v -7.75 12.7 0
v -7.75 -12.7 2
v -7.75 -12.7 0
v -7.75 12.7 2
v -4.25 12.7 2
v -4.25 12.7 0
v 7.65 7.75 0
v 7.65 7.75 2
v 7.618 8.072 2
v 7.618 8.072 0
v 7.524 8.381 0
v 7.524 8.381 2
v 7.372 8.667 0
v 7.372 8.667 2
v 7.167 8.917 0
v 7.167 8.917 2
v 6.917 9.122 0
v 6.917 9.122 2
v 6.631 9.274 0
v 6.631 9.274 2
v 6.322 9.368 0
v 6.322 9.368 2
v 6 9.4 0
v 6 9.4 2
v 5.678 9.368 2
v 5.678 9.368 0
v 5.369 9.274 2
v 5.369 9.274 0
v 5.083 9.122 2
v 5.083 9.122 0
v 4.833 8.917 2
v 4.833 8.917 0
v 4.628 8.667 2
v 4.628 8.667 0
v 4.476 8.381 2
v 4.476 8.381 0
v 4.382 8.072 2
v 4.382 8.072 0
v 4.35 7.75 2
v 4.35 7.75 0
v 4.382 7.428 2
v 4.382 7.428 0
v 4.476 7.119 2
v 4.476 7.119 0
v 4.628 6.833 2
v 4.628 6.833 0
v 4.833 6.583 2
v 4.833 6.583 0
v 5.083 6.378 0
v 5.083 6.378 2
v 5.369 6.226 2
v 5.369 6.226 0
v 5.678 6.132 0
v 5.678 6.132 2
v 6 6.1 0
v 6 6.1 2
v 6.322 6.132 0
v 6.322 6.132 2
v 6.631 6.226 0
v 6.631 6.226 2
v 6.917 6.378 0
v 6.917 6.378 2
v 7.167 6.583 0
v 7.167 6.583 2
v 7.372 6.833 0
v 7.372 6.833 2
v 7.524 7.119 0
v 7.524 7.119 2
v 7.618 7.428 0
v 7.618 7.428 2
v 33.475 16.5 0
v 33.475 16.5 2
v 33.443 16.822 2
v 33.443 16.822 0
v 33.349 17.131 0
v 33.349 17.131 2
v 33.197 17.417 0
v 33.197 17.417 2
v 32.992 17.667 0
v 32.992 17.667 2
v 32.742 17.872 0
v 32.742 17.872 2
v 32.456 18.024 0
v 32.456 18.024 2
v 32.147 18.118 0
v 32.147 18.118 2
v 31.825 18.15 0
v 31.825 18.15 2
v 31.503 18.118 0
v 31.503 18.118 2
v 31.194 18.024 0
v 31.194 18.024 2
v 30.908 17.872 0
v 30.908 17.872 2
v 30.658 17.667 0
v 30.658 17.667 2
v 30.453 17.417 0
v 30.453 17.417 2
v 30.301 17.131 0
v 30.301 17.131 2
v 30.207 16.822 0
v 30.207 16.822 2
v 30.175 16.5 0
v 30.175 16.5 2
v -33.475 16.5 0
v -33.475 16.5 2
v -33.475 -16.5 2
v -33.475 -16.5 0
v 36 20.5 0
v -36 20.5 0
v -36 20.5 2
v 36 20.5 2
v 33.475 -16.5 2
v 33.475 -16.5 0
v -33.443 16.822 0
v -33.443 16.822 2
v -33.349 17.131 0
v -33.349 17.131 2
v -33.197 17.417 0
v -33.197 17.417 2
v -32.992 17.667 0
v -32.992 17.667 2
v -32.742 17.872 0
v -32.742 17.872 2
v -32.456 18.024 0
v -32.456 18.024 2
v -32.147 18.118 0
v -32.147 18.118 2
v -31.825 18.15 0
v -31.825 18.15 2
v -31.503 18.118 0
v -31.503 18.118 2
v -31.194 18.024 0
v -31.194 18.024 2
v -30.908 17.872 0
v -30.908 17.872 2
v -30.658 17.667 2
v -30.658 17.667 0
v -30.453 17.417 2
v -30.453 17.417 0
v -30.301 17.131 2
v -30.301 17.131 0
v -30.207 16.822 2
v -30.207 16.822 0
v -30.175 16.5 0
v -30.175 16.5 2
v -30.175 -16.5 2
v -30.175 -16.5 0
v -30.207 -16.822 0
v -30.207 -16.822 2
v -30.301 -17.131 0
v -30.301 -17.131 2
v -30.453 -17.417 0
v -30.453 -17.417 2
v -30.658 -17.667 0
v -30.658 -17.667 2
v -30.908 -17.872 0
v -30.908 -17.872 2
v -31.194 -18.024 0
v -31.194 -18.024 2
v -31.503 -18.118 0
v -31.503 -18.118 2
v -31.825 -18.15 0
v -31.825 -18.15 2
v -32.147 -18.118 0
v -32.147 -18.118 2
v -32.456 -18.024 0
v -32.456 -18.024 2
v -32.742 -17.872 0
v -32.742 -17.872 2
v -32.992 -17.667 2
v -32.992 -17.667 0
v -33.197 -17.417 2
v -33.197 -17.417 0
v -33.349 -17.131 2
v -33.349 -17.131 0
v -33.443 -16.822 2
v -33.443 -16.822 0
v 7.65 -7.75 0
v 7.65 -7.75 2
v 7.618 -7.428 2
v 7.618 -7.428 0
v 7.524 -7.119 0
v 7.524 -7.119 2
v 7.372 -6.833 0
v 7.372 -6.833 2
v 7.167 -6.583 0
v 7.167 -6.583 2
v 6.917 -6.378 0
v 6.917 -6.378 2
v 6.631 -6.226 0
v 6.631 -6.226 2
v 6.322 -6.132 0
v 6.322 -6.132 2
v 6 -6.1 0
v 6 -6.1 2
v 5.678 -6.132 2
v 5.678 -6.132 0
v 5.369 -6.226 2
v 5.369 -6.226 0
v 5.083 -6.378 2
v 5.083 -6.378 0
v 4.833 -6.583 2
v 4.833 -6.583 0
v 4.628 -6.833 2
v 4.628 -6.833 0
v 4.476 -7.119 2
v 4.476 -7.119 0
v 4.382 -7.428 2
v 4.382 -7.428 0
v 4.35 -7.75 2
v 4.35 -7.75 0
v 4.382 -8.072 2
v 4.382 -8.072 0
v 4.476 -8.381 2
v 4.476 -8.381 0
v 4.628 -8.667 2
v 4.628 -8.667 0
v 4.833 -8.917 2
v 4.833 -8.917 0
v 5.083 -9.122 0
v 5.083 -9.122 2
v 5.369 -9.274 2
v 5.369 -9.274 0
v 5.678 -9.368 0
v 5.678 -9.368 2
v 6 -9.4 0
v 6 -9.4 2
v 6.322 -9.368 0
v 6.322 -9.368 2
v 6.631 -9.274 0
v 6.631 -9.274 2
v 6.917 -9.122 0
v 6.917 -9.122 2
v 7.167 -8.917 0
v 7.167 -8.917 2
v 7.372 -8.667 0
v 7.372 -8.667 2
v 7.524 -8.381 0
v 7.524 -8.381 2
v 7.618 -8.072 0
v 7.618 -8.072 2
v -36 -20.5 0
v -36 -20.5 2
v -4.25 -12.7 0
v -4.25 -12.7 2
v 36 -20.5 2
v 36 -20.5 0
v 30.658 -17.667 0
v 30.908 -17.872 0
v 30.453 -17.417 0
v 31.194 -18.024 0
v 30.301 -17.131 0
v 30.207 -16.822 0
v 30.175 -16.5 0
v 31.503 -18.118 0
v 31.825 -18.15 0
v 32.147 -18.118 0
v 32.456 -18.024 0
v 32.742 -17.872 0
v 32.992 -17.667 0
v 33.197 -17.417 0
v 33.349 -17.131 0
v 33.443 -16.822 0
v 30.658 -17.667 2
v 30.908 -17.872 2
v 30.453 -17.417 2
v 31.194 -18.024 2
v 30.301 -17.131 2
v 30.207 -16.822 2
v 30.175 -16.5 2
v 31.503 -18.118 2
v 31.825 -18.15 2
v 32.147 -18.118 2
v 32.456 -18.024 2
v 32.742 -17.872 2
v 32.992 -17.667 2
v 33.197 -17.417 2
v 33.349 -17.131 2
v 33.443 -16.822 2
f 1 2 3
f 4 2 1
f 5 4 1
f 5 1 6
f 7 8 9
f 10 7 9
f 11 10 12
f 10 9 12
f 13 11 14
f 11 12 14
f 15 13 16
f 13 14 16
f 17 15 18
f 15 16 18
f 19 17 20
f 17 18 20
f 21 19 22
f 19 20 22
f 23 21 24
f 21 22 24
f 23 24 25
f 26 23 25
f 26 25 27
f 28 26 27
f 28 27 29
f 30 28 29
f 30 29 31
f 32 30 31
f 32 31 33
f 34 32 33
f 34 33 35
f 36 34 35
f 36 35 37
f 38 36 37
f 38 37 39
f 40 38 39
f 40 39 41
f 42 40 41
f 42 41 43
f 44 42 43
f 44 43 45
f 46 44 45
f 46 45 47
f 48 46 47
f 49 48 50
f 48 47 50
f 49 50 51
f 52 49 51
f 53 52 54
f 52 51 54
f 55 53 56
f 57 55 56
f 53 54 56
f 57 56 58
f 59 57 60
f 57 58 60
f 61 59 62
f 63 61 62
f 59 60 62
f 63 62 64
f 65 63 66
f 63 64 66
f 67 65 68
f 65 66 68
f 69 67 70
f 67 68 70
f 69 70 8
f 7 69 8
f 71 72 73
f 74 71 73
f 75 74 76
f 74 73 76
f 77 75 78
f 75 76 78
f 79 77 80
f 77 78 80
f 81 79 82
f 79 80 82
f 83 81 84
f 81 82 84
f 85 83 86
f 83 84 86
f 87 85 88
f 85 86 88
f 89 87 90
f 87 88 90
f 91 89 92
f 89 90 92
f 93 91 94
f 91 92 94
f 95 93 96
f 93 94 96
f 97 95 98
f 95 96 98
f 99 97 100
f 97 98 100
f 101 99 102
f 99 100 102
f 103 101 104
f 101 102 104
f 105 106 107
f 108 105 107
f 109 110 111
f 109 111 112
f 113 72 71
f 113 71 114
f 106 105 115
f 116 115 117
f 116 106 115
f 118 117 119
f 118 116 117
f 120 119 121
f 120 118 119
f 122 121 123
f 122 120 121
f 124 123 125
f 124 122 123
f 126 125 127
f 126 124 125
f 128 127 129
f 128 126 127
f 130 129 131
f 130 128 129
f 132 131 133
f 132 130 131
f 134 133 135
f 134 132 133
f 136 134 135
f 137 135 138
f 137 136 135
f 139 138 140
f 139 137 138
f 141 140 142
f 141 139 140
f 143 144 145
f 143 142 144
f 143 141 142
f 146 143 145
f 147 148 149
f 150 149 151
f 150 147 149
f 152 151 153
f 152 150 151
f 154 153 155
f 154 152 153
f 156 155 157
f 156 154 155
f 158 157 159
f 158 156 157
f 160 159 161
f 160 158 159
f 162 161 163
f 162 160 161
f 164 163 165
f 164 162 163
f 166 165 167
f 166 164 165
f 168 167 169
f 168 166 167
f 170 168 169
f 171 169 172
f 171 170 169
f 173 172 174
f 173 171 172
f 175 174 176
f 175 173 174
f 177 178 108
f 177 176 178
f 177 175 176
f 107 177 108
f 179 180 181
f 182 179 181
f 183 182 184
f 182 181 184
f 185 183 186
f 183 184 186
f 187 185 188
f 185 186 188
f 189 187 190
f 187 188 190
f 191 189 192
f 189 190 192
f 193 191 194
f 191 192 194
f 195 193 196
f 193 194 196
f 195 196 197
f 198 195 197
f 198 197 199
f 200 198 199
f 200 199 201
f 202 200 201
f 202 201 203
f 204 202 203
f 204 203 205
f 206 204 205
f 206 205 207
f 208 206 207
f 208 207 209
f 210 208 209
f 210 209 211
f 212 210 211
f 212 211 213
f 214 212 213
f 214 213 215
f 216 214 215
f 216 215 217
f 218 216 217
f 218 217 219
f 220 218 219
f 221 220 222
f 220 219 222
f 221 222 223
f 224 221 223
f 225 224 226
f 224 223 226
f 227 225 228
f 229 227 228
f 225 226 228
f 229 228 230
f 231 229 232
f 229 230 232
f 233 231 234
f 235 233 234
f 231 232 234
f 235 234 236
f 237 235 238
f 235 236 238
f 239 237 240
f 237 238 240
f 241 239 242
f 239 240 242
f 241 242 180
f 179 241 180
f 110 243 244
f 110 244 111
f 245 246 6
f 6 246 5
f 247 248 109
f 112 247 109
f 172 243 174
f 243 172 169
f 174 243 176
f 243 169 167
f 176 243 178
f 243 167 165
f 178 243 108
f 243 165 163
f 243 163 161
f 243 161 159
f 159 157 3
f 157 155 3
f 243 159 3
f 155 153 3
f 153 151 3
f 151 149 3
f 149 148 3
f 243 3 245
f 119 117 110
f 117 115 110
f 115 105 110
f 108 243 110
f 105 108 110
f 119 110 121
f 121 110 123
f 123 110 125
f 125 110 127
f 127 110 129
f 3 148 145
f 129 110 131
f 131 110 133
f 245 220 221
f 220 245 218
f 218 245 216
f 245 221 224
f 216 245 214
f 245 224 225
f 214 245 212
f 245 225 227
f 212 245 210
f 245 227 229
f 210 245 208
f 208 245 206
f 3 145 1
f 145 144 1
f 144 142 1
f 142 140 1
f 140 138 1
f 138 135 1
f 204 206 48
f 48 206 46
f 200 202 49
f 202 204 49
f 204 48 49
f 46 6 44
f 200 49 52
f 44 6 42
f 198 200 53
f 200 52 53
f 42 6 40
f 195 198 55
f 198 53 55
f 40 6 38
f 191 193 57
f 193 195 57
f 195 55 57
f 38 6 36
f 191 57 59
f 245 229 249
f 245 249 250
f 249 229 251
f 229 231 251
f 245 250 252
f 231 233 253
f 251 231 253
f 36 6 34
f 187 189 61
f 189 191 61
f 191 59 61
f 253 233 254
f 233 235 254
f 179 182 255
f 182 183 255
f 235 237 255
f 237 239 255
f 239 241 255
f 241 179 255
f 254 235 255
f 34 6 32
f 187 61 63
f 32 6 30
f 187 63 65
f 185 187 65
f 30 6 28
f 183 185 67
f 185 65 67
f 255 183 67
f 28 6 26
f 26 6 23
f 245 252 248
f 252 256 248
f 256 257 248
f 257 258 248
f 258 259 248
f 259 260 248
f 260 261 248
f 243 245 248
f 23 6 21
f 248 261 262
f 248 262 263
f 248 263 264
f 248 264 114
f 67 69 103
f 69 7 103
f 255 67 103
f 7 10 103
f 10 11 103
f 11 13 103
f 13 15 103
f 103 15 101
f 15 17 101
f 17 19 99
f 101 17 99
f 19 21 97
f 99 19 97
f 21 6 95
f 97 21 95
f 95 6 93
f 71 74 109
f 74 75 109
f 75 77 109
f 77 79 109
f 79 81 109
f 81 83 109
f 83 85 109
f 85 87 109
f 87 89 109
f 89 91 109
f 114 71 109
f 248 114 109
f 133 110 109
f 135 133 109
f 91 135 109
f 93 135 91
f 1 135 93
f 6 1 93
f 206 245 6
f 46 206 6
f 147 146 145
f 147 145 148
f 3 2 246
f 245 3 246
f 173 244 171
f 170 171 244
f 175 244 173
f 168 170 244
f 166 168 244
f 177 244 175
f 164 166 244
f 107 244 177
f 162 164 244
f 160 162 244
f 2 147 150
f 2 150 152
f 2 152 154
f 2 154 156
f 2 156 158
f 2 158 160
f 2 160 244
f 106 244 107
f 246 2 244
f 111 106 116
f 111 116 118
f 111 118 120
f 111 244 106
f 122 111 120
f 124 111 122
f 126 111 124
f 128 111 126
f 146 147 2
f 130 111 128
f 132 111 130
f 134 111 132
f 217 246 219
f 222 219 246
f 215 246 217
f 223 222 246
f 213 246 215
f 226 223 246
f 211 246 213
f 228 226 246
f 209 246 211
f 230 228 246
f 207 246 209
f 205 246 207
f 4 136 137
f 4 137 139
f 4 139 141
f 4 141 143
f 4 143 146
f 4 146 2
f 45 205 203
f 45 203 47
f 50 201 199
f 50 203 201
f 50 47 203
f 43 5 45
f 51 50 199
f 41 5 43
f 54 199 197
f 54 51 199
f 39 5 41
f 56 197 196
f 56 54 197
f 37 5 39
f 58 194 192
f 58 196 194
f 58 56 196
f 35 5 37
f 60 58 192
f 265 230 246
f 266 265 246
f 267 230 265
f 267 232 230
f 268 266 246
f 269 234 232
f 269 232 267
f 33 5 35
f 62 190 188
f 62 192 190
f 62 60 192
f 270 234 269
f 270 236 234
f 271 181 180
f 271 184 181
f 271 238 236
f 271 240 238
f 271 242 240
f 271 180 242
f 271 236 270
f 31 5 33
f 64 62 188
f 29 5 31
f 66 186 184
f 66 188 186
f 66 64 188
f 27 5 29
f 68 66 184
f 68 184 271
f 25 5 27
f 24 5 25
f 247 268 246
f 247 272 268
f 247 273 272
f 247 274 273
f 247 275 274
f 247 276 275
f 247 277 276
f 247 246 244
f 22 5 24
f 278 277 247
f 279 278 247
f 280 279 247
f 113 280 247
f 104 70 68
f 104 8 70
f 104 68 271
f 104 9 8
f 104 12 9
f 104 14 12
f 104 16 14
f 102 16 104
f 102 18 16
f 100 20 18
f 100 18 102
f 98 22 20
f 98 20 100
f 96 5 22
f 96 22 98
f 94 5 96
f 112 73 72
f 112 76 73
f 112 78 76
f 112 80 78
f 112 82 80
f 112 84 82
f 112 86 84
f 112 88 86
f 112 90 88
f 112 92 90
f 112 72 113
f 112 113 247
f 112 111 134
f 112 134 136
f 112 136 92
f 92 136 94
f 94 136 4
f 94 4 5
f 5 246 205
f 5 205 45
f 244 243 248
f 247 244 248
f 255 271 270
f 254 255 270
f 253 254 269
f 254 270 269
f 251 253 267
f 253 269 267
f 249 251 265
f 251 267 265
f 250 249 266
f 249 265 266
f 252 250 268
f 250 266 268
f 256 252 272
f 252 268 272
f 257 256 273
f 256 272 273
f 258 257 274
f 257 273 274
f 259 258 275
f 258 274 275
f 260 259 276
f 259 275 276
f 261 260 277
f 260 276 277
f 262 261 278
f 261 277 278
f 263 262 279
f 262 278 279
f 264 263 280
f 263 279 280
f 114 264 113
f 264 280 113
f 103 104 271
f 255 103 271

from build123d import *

# Parameters (mm, degrees)
SKETCH_W        = 72
SKETCH_H        = 41
PAD_DEPTH       = 2
POCKET_DEPTH    = 167.759861
SKETCH002_R     = 1.65
SKETCH002_W     = 3.5
SKETCH002_H     = 25.4
POCKET001_DEPTH = 2.001


with BuildPart() as part:
    # Sketch → Pad (new body)
    with BuildSketch(Plane.XY):
        Rectangle(SKETCH_W, SKETCH_H)
    extrude(amount=PAD_DEPTH)

    # Sketch001 (on Face6 of Pad) → Pocket (cut, through all)
    with BuildSketch(Plane.XY.offset(2)):
        with BuildLine():
            ThreePointArc((33.475, 16.5), (31.825, 18.15), (30.175, 16.5))
            Line((30.175, 16.5), (30.175, -16.5))
            ThreePointArc((30.175, -16.5), (31.825, -18.15), (33.475, -16.5))
            Line((33.475, 16.5), (33.475, -16.5))
        make_face()
    pocket = extrude(amount=-POCKET_DEPTH, mode=Mode.SUBTRACT)

    # Mirrored: Pocket across YZ
    add(pocket.mirror(Plane.YZ), mode=Mode.SUBTRACT)

    # Sketch002 (on Face5 of Mirrored) → Pocket001 (cut, through all)
    with BuildSketch(Plane.XY.offset(2)):
        with Locations((6, 7.75)):
            Circle(SKETCH002_R)
        with Locations((6, -7.75)):
            Circle(SKETCH002_R)
        with Locations((-6, 0)):
            Rectangle(SKETCH002_W, SKETCH002_H)
    extrude(amount=-POCKET001_DEPTH, mode=Mode.SUBTRACT)


solid = part.part
